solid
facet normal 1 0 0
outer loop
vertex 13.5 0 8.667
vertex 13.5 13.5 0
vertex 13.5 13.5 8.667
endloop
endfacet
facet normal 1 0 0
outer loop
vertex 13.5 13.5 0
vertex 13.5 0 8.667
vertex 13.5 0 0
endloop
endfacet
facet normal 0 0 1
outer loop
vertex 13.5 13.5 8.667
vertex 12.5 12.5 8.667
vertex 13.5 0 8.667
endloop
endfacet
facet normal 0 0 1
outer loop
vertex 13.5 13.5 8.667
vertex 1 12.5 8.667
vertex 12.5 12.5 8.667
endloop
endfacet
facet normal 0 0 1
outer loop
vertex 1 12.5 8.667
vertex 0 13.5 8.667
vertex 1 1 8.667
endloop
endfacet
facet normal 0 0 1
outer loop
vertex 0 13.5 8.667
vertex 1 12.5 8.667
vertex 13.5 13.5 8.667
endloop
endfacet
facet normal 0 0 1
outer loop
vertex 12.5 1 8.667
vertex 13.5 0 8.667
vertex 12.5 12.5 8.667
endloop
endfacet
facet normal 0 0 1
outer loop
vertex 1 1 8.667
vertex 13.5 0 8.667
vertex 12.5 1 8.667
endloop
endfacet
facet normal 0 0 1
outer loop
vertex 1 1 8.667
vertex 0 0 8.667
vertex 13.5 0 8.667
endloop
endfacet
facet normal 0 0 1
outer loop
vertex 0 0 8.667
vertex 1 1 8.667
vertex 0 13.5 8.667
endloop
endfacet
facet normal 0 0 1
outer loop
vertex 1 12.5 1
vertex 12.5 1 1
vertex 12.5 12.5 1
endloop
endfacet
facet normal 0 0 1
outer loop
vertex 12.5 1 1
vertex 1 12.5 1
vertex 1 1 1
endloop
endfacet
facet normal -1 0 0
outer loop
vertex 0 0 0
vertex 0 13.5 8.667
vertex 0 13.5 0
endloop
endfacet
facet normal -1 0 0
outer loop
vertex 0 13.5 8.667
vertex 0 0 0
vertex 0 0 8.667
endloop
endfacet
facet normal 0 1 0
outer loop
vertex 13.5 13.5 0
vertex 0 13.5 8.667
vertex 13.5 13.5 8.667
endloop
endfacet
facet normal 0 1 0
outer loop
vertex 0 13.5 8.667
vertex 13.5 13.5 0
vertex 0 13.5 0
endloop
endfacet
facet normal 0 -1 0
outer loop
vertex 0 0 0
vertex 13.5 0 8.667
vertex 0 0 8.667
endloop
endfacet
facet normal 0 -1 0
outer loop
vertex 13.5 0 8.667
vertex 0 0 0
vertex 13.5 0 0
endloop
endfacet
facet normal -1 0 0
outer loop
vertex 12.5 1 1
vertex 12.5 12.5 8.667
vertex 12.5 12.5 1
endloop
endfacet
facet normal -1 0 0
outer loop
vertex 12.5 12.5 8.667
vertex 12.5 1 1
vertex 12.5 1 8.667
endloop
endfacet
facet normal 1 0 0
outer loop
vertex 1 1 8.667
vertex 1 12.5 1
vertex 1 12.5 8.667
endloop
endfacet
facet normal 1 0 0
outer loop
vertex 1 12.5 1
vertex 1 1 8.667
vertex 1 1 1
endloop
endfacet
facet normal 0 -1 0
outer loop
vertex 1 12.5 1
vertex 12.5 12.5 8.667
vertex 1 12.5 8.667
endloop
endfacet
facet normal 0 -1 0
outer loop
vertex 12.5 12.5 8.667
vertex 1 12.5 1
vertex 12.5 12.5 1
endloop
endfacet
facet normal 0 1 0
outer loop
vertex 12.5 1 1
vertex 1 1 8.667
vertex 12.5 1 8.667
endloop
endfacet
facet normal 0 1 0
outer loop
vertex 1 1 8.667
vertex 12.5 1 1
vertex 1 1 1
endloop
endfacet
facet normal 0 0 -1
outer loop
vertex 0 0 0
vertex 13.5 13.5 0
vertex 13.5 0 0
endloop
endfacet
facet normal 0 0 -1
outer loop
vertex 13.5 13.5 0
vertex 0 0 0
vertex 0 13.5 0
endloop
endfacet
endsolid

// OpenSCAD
/*
————————————————————————————————————————————————————————————————————————————————
CONFIG
————————————————————————————————————————————————————————————————————————————————
*/
$fn=360 / 10;

msdcDimensions = 11.5;
msdcFloor = 1;
msdcWall = 1;
msdcHeight = ( msdcDimensions / 3 ) * 2;

Outer_shell_width = msdcDimensions + (msdcWall * 2);
Outer_shell_length = msdcDimensions + (msdcWall * 2);
Outer_shell_height = msdcHeight + msdcFloor;

Min_floor_height = msdcFloor;

Modules = [1, 1]; // cols, rows

Hang_depth_height = 0 - msdcHeight; // negative = hole depth, positive = pin height. 
Hang_diameter = msdcDimensions;
Hang_faces = 4;
Hang_rotation = 0; // 360 / 4 / 2;

Rendering_transp = 0.9;




/*
————————————————————————————————————————————————————————————————————————————————
MODULES
————————————————————————————————————————————————————————————————————————————————
*/
module start(){
	echo("Script start");
	
	color("red", Rendering_transp)  cube([ // floor
		Outer_shell_width,
		Outer_shell_length,
		Min_floor_height
	]);

	unit_dimensions = [
		Outer_shell_width / Modules[1],
		Outer_shell_length / Modules[0],
		Outer_shell_height - Min_floor_height
	];


	translate([0, 0, Min_floor_height]){ // move up for bottom safe area
		for (
			unit_row_index = [1 : Modules[0]]
		){
			for (
				unit_column_index = [1 : Modules[1]]
			){
				translate([
					(unit_column_index - 1) * unit_dimensions[0],
					(unit_row_index - 1) * unit_dimensions[1],
					0
				]){
					unit(unit_dimensions);
				}
			}
		}
	}

	echo("Script end");
}


module unit(unit_dimensions) {
	if( Hang_depth_height > 0 ){
		union(){
			unit_shell(unit_dimensions);
			hanger(Hang_depth_height, Hang_diameter, unit_dimensions);
		};
	}else{
		difference(){
			unit_shell(unit_dimensions);
			hanger(Hang_depth_height, Hang_diameter, unit_dimensions);
		};
	}
}


module unit_shell(unit_dimensions) {
	color("orange", Rendering_transp) cube(unit_dimensions); // module unit
}


module hanger(Hang_depth_height, diameter, unit_dimensions) {
	translate([
		unit_dimensions[0] / 2,
		unit_dimensions[1] / 2,
		unit_dimensions[2] + (
			Hang_depth_height > 0 ? 0 : Hang_depth_height
		)
	]){
		rotate([
			0 , 0 , Hang_rotation
		]){
			if( Hang_faces == 4 ) {
				translate([
					( diameter / 2 ) * -1,
					( diameter / 2 ) * -1,
					0
				]){
					color("blue", Rendering_transp) cube( // hangers
						size = [
							diameter,
							diameter,
							abs(Hang_depth_height)
						],
						center = false
					);
				};
			} else {
				color("yellow", Rendering_transp) cylinder( // hangers
					h = abs(Hang_depth_height), 
					r1 = diameter / 2, 
					r2 = diameter / 2, 
					center = false,
					$fn = Hang_faces
				);
			}
		}
	}
}




/*
————————————————————————————————————————————————————————————————————————————————
BOOTSTRAP
————————————————————————————————————————————————————————————————————————————————
*/
start();
